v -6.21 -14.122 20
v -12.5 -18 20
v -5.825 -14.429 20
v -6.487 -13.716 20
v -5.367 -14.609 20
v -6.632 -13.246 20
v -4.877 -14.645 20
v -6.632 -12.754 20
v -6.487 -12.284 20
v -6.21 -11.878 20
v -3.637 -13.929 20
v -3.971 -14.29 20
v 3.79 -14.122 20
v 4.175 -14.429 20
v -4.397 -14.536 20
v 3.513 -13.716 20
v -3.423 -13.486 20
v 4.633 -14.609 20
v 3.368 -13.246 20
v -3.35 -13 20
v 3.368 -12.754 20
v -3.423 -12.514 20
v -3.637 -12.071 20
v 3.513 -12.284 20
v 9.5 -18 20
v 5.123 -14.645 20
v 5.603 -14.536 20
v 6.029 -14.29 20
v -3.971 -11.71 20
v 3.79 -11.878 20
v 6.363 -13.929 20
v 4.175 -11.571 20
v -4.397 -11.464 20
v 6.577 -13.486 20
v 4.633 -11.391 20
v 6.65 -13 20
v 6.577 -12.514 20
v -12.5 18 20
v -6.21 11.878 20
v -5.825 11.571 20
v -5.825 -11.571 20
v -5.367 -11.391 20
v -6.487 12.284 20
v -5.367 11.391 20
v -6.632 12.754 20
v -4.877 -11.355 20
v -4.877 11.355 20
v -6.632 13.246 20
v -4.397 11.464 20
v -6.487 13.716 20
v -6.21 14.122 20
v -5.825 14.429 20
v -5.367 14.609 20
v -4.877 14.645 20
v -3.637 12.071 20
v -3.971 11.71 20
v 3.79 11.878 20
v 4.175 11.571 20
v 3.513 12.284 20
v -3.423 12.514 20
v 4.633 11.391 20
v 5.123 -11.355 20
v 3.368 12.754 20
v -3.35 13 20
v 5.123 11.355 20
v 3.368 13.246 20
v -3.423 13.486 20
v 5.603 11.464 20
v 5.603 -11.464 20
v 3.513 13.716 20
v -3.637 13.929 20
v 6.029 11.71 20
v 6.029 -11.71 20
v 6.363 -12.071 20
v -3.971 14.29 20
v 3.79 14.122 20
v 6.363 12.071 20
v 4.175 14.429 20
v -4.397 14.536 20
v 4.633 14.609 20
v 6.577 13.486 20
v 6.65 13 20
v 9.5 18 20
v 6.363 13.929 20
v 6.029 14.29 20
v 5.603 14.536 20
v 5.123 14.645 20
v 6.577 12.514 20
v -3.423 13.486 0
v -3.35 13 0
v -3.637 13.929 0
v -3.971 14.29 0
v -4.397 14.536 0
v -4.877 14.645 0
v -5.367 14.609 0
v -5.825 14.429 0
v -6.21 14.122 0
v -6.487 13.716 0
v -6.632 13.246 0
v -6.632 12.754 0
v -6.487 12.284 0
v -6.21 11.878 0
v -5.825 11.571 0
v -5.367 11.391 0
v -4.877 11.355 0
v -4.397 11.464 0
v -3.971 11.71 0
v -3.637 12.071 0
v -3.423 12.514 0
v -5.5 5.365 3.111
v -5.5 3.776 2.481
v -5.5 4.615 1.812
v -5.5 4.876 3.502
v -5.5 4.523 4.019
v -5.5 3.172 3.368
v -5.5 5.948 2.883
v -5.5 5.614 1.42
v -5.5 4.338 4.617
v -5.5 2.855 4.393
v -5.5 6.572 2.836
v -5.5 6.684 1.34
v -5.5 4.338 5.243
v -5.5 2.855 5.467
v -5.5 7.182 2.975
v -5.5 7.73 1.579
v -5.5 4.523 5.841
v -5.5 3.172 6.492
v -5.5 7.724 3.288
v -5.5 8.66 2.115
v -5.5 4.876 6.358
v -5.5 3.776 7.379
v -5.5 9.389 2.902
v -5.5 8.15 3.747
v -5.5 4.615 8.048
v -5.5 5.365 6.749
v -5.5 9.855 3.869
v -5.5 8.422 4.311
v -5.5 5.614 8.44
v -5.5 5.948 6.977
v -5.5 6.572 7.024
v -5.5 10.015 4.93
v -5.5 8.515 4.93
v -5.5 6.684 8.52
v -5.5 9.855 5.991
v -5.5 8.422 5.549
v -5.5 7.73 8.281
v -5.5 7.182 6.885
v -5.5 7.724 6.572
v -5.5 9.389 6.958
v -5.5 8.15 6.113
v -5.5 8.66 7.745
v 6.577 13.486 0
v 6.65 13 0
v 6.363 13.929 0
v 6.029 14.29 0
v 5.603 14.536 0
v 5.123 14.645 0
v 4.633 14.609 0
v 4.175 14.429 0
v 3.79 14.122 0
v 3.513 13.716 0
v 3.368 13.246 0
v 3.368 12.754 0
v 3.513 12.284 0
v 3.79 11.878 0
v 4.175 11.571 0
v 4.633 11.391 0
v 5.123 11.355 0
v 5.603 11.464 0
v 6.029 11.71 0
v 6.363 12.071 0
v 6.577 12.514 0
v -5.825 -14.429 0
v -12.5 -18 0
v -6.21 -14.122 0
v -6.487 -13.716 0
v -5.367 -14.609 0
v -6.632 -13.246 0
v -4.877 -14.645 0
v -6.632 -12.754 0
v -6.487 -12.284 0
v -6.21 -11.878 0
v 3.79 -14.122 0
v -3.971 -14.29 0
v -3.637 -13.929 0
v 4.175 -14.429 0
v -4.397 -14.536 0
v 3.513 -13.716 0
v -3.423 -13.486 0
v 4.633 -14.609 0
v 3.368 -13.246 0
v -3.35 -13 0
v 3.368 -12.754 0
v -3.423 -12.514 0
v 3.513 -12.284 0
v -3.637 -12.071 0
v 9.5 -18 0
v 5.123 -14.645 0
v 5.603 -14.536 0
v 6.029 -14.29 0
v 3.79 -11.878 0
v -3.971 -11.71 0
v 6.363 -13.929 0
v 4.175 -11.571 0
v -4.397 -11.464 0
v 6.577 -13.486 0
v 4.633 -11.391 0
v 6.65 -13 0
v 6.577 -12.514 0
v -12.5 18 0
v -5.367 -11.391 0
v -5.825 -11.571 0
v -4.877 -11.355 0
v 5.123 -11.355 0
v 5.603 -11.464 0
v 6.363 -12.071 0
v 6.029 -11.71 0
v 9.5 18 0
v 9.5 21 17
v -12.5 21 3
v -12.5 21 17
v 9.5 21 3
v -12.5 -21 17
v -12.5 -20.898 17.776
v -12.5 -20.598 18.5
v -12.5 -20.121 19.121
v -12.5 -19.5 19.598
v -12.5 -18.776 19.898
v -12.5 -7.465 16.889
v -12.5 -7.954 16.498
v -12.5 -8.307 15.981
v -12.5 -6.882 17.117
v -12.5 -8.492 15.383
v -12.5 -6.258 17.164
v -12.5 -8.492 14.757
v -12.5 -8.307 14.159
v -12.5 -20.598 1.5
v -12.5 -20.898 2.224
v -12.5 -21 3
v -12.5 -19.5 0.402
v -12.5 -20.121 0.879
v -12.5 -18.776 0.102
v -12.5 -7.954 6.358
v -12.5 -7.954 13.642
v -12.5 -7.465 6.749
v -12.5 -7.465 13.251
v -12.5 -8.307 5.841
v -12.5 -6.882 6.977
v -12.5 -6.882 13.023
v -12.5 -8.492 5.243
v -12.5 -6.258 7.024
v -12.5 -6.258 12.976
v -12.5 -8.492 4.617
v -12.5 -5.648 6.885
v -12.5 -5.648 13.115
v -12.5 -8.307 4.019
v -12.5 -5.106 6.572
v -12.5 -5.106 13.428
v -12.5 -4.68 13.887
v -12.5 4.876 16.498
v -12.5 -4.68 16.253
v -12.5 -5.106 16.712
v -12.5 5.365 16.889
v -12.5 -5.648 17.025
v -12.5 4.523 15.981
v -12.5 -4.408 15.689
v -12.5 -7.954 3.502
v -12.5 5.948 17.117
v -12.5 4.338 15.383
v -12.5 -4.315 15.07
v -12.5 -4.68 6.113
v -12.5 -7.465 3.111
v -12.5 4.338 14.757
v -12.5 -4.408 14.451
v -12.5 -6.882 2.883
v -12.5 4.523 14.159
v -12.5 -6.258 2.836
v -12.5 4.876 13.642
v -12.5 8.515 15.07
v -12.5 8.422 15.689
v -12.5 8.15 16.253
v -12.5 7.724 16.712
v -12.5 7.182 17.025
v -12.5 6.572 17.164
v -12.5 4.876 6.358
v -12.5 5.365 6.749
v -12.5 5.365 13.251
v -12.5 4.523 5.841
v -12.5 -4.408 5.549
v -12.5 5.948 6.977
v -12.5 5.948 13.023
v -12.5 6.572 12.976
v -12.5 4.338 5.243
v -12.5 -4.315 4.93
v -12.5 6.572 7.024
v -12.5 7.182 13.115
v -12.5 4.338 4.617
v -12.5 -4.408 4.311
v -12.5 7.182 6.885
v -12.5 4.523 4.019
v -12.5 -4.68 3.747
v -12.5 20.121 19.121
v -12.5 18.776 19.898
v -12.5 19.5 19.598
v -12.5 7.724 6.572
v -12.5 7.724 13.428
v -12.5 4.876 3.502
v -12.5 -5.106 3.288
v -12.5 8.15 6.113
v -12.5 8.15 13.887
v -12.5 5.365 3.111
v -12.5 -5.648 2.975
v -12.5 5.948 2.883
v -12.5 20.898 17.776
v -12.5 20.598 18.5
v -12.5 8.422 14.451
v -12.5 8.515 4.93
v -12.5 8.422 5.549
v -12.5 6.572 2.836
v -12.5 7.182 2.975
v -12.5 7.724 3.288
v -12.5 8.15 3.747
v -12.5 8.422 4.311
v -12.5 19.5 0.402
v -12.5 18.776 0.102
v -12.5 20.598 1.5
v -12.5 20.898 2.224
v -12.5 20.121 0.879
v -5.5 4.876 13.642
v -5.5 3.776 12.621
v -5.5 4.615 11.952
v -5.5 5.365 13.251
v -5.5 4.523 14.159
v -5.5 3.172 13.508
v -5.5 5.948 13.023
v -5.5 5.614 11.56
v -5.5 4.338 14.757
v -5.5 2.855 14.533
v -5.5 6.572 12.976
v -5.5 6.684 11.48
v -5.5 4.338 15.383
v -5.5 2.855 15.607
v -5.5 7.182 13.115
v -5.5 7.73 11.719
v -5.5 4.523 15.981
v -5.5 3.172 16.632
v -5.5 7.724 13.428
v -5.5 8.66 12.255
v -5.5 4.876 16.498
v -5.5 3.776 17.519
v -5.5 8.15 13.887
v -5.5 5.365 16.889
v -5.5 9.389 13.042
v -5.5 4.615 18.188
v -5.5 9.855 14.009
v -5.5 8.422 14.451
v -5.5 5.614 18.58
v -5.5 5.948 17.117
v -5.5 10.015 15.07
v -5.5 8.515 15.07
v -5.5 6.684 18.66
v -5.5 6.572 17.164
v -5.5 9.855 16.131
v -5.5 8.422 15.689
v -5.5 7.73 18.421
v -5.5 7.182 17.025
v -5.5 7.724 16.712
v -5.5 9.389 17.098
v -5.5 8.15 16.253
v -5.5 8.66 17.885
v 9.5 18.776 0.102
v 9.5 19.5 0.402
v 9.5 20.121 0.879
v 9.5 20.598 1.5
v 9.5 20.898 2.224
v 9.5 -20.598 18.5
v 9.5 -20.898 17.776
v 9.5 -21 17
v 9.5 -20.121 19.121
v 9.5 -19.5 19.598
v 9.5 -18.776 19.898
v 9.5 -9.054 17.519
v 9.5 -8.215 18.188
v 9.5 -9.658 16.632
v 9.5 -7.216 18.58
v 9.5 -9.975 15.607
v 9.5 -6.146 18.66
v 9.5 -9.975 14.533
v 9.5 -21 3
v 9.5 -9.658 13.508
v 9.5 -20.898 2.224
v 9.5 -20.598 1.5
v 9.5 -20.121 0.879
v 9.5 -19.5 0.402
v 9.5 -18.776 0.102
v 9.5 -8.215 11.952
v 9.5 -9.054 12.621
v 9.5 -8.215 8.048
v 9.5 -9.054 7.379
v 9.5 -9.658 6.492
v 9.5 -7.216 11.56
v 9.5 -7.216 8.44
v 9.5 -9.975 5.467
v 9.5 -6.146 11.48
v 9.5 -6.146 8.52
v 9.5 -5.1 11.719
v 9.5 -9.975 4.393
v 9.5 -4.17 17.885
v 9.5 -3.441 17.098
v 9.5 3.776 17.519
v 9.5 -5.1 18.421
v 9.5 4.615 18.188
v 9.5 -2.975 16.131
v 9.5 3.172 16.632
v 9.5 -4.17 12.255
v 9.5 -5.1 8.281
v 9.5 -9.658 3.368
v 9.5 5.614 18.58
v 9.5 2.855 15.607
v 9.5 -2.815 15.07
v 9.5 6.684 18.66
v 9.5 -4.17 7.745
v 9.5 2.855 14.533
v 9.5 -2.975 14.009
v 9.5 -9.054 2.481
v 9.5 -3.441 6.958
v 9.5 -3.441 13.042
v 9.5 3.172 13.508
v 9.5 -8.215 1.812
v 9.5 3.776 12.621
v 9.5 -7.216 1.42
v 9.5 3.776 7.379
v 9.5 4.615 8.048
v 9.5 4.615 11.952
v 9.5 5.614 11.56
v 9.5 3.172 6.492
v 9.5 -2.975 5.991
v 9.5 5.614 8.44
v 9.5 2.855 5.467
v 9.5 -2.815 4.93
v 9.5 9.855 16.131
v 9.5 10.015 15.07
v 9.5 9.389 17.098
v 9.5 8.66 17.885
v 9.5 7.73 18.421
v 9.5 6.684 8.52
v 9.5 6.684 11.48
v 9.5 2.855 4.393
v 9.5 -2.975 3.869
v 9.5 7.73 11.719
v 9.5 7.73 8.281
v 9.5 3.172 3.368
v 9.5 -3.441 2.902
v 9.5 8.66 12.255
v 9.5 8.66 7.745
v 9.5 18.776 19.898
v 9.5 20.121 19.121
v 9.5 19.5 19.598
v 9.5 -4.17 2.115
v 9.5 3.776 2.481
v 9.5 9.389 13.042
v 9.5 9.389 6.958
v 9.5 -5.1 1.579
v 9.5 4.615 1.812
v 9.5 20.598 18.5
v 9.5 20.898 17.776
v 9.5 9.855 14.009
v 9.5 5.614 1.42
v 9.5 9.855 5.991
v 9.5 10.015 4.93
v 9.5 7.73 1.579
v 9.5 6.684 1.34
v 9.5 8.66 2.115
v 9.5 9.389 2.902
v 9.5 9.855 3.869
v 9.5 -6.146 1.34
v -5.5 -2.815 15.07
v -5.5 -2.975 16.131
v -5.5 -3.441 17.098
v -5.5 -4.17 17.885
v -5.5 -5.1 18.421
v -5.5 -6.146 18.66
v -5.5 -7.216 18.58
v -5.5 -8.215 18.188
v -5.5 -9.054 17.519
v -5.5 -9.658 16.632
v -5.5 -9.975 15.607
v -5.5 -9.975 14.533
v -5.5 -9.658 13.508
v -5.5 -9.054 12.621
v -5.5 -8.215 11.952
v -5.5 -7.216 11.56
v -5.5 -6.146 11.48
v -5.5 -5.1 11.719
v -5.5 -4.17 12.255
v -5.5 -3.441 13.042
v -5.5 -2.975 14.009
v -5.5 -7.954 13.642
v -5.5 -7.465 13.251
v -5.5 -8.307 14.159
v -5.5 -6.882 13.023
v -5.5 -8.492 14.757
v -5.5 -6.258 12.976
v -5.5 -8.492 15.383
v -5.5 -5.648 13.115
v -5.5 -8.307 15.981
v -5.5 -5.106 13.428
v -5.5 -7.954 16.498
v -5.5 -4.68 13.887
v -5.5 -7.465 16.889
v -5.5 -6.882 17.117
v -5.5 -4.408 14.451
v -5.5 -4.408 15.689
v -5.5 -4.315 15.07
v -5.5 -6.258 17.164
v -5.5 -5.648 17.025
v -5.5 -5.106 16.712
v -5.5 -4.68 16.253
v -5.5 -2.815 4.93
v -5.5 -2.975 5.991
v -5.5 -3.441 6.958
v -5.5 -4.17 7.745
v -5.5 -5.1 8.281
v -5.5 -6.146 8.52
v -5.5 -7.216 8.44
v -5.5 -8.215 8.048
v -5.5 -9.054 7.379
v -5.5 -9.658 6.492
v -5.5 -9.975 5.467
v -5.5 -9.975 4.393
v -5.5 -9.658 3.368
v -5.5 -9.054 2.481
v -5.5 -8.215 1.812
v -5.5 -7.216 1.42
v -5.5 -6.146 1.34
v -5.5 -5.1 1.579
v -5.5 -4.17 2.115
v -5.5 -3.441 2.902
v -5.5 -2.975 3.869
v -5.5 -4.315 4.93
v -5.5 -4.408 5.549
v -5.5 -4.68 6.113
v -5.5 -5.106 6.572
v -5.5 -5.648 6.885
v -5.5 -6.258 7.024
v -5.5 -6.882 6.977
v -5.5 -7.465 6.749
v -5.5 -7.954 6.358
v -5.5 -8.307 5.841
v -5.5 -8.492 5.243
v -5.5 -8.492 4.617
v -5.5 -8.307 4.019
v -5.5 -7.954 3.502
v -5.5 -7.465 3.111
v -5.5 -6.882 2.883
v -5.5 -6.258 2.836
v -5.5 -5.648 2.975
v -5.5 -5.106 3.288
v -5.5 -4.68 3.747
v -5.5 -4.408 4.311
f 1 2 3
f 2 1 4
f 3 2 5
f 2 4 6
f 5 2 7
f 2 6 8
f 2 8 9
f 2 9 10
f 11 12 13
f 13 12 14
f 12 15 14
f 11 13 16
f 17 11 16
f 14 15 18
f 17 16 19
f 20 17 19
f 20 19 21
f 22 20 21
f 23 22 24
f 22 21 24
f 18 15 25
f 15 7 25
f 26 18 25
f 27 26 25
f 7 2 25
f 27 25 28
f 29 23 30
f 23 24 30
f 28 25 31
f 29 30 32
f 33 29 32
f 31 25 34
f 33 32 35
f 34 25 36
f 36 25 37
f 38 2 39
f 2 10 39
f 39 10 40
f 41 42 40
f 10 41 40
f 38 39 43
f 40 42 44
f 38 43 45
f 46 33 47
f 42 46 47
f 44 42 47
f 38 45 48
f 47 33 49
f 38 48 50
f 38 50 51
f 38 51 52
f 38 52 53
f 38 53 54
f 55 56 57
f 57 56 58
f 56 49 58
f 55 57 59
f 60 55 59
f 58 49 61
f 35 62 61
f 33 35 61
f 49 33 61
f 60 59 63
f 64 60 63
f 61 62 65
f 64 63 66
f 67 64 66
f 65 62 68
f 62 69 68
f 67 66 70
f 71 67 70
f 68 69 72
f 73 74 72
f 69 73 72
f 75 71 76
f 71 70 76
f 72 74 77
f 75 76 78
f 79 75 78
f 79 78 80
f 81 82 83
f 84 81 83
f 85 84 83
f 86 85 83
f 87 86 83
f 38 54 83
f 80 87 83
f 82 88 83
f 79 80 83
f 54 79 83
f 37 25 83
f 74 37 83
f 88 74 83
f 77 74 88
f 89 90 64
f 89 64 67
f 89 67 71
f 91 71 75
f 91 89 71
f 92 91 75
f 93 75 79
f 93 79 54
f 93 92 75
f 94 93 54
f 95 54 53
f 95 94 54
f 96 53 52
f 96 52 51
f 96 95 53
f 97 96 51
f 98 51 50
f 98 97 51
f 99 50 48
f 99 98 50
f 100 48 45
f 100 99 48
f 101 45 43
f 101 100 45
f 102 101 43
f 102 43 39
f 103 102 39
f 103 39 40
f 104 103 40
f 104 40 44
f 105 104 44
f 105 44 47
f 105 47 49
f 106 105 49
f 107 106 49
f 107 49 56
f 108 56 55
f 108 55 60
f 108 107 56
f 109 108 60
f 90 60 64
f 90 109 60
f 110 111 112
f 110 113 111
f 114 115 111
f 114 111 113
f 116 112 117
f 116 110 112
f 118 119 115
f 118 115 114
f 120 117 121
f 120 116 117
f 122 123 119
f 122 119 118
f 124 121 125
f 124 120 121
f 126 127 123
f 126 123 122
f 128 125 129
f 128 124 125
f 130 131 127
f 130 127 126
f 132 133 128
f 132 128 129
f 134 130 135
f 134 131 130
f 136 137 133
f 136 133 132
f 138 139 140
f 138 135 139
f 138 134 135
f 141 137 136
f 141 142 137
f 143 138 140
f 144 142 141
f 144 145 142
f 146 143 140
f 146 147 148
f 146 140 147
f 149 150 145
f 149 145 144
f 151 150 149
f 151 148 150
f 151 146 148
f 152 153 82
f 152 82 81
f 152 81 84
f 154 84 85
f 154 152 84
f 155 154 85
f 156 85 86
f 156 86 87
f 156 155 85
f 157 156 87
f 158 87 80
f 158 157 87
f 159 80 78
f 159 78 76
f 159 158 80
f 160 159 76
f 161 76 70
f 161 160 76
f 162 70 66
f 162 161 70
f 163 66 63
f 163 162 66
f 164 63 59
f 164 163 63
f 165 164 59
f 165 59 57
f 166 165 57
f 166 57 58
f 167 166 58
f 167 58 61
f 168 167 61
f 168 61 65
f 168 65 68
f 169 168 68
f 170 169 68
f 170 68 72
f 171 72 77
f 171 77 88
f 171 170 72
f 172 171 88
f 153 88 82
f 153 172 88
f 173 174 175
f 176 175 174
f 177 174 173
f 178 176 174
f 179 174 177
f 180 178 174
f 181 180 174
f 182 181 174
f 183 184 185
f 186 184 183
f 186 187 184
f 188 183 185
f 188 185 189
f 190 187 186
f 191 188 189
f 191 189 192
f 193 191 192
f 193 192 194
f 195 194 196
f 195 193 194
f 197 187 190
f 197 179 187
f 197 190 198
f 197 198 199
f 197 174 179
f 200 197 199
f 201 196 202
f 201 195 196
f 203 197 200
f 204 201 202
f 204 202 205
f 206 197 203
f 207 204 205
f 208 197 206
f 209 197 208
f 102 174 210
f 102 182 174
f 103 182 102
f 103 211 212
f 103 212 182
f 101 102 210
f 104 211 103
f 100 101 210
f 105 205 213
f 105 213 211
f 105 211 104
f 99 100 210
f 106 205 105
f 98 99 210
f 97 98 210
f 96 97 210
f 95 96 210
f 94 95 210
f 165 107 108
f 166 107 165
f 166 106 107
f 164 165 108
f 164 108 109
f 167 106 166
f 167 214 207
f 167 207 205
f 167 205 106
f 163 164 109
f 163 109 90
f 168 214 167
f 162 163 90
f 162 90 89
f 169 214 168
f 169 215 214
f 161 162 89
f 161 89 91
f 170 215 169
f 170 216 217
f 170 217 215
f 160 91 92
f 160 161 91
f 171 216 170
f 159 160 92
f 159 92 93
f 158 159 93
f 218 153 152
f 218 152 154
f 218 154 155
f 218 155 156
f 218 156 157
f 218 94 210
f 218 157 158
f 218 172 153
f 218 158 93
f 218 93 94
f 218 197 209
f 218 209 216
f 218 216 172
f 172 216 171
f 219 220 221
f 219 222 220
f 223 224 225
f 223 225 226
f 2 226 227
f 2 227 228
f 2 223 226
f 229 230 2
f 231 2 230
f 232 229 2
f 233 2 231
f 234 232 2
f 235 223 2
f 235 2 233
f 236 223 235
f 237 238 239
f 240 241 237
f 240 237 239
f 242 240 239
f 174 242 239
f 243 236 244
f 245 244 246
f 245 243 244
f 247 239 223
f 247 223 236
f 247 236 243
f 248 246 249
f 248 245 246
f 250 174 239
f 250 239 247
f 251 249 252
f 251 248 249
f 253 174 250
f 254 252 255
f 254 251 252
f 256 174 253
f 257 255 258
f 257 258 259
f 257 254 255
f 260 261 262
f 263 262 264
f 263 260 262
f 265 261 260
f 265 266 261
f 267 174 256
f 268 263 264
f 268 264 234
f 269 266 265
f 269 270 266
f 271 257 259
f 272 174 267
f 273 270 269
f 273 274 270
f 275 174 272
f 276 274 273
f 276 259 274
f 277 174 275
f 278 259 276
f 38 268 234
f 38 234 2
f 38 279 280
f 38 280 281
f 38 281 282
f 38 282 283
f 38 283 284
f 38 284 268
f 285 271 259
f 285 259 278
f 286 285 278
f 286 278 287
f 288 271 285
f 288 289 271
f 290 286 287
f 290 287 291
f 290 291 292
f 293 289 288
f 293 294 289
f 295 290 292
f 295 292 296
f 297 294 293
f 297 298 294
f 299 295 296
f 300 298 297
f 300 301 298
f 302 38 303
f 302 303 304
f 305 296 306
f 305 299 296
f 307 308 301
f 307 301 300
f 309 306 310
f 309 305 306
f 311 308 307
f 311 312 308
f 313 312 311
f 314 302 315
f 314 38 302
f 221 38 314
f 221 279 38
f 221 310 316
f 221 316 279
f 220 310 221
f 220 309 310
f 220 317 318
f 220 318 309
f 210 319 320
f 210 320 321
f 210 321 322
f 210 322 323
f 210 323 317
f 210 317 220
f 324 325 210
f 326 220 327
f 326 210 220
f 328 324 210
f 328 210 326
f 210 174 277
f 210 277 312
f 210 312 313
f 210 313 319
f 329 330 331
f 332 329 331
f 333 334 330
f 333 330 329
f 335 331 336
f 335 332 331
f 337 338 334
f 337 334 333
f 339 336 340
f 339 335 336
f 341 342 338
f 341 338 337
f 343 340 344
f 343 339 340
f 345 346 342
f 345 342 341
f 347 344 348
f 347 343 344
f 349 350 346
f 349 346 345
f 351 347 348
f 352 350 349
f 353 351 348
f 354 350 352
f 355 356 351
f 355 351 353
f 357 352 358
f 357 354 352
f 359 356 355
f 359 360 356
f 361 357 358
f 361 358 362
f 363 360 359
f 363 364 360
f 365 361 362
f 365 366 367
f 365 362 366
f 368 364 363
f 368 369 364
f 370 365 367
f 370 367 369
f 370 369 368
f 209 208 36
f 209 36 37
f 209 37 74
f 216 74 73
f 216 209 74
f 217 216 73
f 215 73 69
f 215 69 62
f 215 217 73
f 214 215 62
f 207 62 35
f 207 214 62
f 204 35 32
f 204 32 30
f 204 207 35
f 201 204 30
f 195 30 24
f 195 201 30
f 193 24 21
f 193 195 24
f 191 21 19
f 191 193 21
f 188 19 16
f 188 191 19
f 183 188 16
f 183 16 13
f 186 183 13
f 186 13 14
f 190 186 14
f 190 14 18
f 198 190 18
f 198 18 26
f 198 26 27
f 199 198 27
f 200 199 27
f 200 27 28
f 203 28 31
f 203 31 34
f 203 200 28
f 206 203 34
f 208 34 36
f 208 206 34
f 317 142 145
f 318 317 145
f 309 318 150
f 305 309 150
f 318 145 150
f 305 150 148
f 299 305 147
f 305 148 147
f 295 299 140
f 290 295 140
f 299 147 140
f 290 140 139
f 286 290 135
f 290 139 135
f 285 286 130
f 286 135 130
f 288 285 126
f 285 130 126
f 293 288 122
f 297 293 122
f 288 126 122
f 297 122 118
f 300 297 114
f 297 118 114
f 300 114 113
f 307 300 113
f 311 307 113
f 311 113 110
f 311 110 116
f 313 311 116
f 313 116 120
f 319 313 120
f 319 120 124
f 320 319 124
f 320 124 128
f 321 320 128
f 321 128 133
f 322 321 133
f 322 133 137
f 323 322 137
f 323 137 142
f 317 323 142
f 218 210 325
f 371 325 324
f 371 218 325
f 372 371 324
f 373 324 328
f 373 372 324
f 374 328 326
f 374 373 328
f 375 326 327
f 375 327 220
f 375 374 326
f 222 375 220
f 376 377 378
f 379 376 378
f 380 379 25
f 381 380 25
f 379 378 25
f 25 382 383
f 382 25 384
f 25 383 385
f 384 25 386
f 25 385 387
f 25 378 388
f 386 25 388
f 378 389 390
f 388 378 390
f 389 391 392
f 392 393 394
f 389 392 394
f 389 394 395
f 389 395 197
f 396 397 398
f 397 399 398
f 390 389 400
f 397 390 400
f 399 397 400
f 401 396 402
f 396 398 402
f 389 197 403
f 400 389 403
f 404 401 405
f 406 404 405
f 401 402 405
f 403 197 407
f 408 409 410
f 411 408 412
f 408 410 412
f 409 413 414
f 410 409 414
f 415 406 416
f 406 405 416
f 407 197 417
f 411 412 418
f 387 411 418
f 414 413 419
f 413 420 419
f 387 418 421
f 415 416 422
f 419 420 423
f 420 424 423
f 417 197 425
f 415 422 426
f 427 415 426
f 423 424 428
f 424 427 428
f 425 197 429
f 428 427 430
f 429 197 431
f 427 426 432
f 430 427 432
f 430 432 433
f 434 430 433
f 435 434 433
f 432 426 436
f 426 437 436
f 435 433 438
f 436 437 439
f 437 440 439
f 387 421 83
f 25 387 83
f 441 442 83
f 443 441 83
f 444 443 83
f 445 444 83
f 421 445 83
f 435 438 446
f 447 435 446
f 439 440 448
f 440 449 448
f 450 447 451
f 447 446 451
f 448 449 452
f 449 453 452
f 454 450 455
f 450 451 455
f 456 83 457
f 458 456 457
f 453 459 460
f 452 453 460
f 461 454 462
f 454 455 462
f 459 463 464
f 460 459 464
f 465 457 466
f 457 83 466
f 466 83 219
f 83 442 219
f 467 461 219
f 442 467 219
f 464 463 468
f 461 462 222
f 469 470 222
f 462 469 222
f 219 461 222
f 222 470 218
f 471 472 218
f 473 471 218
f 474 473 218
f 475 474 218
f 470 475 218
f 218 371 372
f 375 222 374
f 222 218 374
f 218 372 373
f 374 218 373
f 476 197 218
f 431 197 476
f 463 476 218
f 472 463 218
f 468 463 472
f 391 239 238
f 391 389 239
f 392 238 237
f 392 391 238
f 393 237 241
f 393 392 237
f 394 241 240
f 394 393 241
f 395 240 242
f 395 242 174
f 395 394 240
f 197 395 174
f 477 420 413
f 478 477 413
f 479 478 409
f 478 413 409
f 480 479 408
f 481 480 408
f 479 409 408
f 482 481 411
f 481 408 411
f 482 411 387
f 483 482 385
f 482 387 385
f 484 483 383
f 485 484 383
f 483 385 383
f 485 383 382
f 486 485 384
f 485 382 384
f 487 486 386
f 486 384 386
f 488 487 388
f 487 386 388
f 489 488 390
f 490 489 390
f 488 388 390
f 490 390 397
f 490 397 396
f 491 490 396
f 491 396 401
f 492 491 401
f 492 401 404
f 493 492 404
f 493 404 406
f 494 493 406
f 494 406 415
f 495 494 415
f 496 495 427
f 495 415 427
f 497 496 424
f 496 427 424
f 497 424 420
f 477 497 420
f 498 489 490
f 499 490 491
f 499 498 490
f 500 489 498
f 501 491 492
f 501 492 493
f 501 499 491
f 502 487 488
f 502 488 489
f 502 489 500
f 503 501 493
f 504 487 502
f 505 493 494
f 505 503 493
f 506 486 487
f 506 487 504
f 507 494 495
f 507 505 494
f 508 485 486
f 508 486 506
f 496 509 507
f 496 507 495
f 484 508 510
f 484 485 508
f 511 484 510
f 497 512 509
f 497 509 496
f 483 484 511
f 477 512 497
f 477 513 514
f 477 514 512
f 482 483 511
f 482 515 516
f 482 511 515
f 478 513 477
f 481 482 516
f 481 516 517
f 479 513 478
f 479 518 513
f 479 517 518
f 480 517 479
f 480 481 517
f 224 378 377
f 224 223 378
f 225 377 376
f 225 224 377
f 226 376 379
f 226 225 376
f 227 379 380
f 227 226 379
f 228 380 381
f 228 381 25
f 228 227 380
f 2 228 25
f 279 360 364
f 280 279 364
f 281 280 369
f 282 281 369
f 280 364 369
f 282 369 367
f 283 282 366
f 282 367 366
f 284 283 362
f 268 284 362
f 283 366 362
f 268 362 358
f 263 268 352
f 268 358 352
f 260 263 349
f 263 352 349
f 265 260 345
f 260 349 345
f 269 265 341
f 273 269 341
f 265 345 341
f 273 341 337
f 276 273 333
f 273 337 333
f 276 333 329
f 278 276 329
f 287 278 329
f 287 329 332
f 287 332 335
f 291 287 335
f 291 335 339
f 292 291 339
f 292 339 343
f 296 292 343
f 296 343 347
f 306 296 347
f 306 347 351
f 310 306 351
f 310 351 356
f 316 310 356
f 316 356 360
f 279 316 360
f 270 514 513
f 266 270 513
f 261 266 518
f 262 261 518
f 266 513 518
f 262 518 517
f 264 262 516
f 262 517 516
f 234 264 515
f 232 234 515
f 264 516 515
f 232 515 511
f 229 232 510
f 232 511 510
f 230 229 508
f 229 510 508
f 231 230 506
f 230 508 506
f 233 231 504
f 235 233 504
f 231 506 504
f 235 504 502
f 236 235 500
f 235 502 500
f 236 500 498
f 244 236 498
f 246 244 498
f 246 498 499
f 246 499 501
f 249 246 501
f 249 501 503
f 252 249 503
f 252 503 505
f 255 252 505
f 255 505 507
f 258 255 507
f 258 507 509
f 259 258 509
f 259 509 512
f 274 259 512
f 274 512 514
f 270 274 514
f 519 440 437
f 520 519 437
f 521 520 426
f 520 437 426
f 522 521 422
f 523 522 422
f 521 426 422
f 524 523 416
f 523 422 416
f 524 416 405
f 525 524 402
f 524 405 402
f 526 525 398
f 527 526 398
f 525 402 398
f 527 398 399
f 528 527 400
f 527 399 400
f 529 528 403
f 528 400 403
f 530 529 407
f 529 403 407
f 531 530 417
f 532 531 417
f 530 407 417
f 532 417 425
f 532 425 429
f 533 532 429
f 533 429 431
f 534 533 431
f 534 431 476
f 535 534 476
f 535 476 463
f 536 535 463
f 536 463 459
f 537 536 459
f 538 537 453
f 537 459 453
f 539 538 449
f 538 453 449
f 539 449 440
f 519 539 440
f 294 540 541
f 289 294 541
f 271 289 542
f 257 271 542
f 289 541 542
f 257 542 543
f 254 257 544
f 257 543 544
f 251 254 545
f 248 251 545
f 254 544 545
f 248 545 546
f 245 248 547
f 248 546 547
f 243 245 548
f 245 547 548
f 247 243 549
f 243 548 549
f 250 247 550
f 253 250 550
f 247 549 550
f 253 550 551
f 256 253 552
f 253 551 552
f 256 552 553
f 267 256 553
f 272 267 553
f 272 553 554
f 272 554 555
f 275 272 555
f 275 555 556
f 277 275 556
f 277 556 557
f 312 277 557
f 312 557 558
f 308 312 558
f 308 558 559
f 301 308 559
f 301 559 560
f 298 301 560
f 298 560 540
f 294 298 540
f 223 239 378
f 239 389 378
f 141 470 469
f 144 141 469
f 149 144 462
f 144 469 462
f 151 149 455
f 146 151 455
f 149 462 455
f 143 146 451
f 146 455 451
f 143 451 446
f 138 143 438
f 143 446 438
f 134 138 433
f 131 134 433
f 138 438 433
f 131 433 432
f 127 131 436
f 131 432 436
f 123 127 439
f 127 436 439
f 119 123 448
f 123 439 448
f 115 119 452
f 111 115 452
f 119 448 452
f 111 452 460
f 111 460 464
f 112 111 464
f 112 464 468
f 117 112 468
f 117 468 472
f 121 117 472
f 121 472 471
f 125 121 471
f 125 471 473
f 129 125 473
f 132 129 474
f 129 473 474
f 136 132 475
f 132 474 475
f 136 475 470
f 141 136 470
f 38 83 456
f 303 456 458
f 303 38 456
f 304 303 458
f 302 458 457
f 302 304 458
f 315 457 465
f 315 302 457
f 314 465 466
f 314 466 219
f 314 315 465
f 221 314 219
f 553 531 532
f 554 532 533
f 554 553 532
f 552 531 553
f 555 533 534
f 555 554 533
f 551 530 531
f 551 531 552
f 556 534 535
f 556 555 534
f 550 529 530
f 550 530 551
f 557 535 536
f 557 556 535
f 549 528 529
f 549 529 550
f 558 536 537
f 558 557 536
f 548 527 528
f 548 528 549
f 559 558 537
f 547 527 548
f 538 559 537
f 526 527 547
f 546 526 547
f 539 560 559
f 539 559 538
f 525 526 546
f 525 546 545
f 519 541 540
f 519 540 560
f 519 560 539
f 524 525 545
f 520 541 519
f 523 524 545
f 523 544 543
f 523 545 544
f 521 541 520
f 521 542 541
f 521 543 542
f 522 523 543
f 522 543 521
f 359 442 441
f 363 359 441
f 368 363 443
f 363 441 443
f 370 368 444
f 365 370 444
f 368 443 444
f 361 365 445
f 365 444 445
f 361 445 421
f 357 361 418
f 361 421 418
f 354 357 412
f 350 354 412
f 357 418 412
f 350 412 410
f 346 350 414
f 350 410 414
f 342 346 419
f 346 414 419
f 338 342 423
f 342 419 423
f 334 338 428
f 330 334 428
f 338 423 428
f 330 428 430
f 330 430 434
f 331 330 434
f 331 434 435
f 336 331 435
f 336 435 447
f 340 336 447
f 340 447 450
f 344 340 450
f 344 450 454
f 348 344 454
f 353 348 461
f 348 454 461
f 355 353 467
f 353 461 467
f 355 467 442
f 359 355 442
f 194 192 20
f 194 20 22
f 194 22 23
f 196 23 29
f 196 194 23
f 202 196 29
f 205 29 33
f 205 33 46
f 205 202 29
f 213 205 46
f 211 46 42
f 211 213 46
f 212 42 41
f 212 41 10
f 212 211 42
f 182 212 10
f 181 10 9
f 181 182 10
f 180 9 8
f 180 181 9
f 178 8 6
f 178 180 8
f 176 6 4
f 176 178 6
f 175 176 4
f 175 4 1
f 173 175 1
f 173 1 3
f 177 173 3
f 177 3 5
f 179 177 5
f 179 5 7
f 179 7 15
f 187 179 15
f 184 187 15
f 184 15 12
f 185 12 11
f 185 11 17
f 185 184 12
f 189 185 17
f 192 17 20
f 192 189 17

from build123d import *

# Parameters (mm, degrees)
F0_W     = 19
F0_H     = 42
F0_R     = 1.65
F1_DEPTH = 20
F3_DEPTH = 3
F2_R     = 2.1
F4_DEPTH = 22
F2_R_2   = 3.6
F5_DEPTH = 15
F6_R     = 3


with BuildPart() as f1:
    # F0 (on Top) → F1 (new body)
    with BuildSketch(Plane.XY):
        Rectangle(F0_W, F0_H)
        with Locations((-5, -13)):
            Circle(F0_R, mode=Mode.SUBTRACT)
        with Locations((5, -13)):
            Circle(F0_R, mode=Mode.SUBTRACT)
        with Locations((-5, 13)):
            Circle(F0_R, mode=Mode.SUBTRACT)
        with Locations((5, 13)):
            Circle(F0_R, mode=Mode.SUBTRACT)
    extrude(amount=F1_DEPTH)

    # F3 (add): a face of the model
    f3_faces = [f1.faces().sort_by_distance(p)[0] for p in [
        (-9.5, 0, 10),
    ]]
    extrude(f3_faces, amount=F3_DEPTH)

    # F2 (on face) → F4 (cut, through all)
    with BuildSketch(Plane.YZ.offset(9.5)):
        with Locations((-6.415, 15.07)):
            Circle(F2_R)
        with Locations((6.415, 15.07)):
            Circle(F2_R)
        with Locations((6.415, 4.93)):
            Circle(F2_R)
        with Locations((-6.415, 4.93)):
            Circle(F2_R)
    extrude(amount=-F4_DEPTH, mode=Mode.SUBTRACT)

    # F2 (on face) → F5 (cut)
    with BuildSketch(Plane.YZ.offset(9.5)):
        with Locations((6.415, 15.07)):
            Circle(F2_R_2)
        with Locations((6.415, 15.07)):
            Circle(F2_R, mode=Mode.SUBTRACT)
        with Locations((6.415, 4.93)):
            Circle(F2_R_2)
        with Locations((6.415, 4.93)):
            Circle(F2_R, mode=Mode.SUBTRACT)
        with Locations((-6.415, 4.93)):
            Circle(F2_R_2)
        with Locations((-6.415, 4.93)):
            Circle(F2_R, mode=Mode.SUBTRACT)
        with Locations((-6.415, 15.07)):
            Circle(F2_R_2)
        with Locations((-6.415, 15.07)):
            Circle(F2_R, mode=Mode.SUBTRACT)
    extrude(amount=-F5_DEPTH, mode=Mode.SUBTRACT)

    # F6
    f6_edges = [f1.edges().sort_by_distance(p)[0] for p in [
        (-1.5, 21, 0),
        (-1.5, -21, 0),
        (-1.5, -21, 20),
        (-1.5, 21, 20),
    ]]
    fillet(f6_edges, radius=F6_R)


solid = f1.part
